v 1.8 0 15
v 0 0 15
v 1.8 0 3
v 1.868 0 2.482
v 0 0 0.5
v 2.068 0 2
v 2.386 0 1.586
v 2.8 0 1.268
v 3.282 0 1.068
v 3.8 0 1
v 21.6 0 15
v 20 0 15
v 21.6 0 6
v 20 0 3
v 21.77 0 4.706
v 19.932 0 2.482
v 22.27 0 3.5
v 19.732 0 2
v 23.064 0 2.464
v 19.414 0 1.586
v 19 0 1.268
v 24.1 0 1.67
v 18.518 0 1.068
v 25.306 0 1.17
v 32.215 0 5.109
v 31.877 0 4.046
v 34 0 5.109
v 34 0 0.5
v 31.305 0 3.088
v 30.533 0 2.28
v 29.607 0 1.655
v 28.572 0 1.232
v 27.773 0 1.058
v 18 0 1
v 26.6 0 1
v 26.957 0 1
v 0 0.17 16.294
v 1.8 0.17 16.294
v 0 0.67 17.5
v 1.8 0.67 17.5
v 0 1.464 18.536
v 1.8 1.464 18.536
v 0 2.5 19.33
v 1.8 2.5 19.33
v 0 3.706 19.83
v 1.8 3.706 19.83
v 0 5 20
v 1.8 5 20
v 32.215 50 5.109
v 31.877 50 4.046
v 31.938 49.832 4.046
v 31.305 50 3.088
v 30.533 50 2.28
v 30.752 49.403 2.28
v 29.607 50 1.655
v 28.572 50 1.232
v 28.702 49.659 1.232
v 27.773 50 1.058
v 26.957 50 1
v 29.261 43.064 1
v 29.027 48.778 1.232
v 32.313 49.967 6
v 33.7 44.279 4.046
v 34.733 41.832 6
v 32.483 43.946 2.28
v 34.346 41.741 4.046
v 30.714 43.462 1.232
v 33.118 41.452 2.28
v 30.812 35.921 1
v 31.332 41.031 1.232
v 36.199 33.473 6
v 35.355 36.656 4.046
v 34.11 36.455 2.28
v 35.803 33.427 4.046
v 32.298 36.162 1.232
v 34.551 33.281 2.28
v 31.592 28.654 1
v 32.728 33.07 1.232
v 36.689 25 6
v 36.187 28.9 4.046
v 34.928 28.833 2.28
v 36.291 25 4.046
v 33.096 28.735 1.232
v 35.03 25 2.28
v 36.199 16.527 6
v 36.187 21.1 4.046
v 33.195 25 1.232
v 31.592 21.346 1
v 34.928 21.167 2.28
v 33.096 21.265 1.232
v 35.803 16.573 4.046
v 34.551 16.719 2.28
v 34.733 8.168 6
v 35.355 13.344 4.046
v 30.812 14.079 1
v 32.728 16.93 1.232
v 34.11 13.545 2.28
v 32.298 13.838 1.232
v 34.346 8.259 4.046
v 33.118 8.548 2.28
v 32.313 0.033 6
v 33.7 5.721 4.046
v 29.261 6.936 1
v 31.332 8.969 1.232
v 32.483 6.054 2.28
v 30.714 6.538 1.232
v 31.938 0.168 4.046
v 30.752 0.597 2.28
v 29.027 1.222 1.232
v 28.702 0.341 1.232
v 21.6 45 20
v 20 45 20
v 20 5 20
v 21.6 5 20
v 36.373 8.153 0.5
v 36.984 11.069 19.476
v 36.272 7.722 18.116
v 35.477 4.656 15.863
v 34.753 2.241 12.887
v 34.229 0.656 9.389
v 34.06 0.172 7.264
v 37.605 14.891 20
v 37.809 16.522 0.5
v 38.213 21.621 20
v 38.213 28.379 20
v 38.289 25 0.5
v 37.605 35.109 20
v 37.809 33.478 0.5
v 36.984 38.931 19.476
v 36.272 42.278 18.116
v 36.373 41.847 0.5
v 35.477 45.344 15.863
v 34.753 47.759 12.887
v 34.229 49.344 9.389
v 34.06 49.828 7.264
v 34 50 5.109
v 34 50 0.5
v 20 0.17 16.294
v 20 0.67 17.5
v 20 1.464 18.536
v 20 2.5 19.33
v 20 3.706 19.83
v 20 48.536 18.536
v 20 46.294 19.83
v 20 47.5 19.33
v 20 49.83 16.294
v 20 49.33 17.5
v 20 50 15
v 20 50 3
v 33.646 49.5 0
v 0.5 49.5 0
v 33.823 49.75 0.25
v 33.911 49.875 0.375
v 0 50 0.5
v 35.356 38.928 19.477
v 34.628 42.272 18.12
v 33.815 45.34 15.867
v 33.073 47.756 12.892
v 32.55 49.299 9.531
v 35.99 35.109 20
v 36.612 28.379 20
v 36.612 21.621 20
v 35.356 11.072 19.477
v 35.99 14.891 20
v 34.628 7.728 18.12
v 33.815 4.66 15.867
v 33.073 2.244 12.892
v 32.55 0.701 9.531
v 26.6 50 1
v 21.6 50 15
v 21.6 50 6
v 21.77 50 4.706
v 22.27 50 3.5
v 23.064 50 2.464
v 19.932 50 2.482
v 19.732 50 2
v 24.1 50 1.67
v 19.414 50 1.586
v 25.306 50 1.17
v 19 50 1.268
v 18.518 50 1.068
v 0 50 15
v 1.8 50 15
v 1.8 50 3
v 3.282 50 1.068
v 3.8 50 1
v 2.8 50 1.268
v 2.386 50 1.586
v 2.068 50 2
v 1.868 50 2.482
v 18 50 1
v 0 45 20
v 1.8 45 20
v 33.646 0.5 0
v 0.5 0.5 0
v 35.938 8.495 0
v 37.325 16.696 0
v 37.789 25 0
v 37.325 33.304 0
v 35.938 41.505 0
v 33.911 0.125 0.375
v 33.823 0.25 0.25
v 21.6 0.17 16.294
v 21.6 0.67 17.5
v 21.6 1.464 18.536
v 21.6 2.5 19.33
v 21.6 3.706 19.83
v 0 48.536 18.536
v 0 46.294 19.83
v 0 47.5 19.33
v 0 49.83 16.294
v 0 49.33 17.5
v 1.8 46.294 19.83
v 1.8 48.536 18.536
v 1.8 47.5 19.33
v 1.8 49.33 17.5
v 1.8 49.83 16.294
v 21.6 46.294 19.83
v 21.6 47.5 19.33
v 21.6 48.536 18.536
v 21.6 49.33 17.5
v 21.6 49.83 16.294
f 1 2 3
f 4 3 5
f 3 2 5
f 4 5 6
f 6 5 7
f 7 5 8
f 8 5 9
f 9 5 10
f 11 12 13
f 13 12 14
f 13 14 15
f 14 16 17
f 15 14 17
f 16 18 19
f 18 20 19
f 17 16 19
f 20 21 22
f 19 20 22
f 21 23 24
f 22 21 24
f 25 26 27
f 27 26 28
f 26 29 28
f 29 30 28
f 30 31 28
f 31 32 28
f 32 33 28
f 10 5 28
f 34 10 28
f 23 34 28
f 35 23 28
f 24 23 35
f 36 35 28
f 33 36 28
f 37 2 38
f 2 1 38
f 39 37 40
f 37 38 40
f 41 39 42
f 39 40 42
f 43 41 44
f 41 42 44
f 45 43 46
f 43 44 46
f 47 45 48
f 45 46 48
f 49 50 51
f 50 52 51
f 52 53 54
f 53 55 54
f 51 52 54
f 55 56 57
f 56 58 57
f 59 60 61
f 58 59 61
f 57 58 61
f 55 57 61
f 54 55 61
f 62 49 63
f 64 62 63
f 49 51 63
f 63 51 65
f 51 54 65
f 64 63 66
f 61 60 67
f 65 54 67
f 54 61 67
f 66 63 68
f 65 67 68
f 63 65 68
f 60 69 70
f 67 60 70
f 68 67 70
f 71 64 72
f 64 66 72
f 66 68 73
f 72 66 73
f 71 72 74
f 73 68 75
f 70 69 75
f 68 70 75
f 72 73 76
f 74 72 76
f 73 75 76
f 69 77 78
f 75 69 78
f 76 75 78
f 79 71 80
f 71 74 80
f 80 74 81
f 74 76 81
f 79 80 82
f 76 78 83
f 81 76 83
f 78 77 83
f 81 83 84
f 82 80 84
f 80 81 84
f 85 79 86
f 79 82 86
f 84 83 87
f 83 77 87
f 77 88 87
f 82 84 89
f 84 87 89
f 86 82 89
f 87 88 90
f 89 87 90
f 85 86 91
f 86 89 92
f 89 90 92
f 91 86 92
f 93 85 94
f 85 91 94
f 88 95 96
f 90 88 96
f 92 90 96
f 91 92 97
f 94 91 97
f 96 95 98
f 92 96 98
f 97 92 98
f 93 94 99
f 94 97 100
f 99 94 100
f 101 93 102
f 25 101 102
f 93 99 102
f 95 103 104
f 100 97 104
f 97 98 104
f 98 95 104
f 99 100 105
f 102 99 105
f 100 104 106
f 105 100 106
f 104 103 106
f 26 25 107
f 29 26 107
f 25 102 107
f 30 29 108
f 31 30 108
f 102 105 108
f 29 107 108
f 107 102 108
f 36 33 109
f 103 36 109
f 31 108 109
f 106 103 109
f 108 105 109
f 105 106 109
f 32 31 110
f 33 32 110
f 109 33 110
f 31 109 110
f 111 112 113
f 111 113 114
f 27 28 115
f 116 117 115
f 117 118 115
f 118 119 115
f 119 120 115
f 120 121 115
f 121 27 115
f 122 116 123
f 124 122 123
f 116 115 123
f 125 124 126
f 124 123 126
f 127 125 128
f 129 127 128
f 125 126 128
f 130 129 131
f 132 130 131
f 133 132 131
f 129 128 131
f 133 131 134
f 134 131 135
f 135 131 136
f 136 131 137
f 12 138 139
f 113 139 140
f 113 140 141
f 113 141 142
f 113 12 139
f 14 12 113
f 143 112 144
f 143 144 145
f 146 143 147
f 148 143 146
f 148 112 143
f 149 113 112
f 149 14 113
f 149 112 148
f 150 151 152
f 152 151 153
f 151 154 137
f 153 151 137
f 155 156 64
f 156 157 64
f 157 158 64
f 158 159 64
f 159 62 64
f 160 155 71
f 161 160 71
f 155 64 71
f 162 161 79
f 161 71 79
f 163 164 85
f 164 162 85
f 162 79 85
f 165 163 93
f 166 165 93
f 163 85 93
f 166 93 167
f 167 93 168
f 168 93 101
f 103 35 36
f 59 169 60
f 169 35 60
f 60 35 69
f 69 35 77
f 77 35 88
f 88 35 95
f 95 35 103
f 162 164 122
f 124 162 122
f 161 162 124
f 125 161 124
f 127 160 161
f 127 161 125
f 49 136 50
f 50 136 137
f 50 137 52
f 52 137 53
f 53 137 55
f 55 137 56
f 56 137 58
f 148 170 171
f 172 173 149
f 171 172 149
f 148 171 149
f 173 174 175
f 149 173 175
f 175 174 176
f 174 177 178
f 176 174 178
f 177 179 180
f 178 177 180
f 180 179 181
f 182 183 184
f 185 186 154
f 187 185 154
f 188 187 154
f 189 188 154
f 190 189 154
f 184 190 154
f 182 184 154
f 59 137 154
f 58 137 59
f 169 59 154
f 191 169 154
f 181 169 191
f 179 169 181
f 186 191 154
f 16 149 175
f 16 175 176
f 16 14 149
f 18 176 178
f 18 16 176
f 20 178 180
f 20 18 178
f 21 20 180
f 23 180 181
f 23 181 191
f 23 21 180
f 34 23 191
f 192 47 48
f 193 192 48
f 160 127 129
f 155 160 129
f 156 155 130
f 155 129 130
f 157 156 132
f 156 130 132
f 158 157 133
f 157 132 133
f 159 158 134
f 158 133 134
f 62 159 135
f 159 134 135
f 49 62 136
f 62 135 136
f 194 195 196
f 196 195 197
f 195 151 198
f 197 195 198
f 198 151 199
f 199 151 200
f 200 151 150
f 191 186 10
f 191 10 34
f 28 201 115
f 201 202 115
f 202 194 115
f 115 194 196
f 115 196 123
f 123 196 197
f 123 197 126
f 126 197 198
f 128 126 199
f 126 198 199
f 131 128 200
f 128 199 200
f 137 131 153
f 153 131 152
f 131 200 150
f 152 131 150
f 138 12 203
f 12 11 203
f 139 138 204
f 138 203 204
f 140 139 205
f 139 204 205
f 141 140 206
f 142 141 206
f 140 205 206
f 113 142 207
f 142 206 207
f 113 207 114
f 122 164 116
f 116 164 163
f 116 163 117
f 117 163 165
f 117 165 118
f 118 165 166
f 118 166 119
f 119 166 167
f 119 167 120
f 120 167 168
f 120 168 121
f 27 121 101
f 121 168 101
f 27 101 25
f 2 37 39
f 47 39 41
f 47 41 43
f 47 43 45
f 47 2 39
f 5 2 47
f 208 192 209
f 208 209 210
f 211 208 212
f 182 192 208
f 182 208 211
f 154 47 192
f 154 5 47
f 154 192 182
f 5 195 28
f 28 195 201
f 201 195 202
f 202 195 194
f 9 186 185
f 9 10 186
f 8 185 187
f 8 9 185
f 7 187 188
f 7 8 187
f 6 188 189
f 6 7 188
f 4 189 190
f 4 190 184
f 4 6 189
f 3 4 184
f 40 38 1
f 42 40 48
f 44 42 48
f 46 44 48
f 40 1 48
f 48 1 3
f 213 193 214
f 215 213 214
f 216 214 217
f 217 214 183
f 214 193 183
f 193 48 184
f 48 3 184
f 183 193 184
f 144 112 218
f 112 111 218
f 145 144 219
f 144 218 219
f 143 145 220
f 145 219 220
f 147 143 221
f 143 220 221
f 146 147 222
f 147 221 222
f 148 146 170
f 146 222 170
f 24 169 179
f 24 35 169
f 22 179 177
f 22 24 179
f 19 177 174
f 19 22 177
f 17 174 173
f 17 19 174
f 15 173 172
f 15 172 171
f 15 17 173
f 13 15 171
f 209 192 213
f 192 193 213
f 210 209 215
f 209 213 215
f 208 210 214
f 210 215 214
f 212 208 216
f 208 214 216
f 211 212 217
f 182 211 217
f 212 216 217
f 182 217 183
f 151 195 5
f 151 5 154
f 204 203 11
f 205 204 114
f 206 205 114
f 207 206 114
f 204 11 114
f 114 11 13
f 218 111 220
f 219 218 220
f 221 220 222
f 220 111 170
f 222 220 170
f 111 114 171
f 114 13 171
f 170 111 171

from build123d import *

# Parameters (mm, degrees)
F0_W         = 1.8
F0_H         = 50
F0_W_2       = 18.2
F0_W_3       = 1.6
F1_DEPTH     = 1
F2_DEPTH     = 20
F3_DEPTH     = 20
F4_T4_DEPTH  = 76.7042031505
F4_T9_DEPTH  = 76.6048284538
F4_T14_DEPTH = 76.8048284538
F4_T19_DEPTH = 76.7042031505
F4_T24_DEPTH = 76.6048284538
F4_T29_DEPTH = 76.8048284538
F5_R         = 5
F6_R         = 2
F7_R         = 5
F8_SIZE      = 0.5


# Not quite as in the source:
# - a fillet or chamfer that OpenCascade refuses, or shapes differently, is made with other operations: its cross-section is extruded or revolved along the edge and cut away or added


with BuildPart() as f1:
    # F0 (on Top) → F1 (new body)
    with BuildSketch(Plane.XY):
        with Locations((0.9, 25)):
            Rectangle(F0_W, F0_H)
        with Locations((10.9, 25)):
            Rectangle(F0_W_2, F0_H)
        with Locations((20.8, 25)):
            Rectangle(F0_W_3, F0_H)
        with BuildLine():
            Line((21.6, 50), (21.6, 0))
            Line((21.6, 0), (32.3006253033, 0))
            ThreePointArc((32.3006253033, 0), (36.6893218813, 25), (32.3006253033, 50))
            Line((32.3006253033, 50), (21.6, 50))
        make_face()
        with BuildLine():
            ThreePointArc((32.3006253033, 50), (36.6893218813, 25), (32.3006253033, 0))
            Line((32.3006253033, 0), (34, 0))
            ThreePointArc((34, 0), (38.2893218813, 25), (34, 50))
            Line((34, 50), (32.3006253033, 50))
        make_face()
    extrude(amount=F1_DEPTH)

    # F0 (on Top) → F2 (join)
    with BuildSketch(Plane.XY):
        with Locations((0.9, 25)):
            Rectangle(F0_W, F0_H)
        with Locations((20.8, 25)):
            Rectangle(F0_W_3, F0_H)
    extrude(amount=F2_DEPTH)

    # F0 (on Top) → F3 (join)
    with BuildSketch(Plane.XY):
        with BuildLine():
            ThreePointArc((32.3006253033, 50), (36.6893218813, 25), (32.3006253033, 0))
            Line((32.3006253033, 0), (34, 0))
            ThreePointArc((34, 0), (38.2893218813, 25), (34, 50))
            Line((34, 50), (32.3006253033, 50))
        make_face()
    extrude(amount=F3_DEPTH)

    # F4: fillet of radius 15 on 6 edges, made by hand


with BuildPart() as f4_tool2:
    # F4_s3 → F4_t4 (new body)
    with BuildSketch(Plane.YZ.offset(-5.2017889236)):
        with BuildLine():
            ThreePointArc((15.0009656854, 20.0004), (4.3933982822, 15.6066017178), (-0.0004, 4.9990343146))
            Line((-0.0004, 4.9990343146), (-1.5005365685, 4.9990343146))
            ThreePointArc((-1.5005365685, 4.9990343146), (-1.5001365685, 12.4995171573), (-1.5001365685, 20))
            Line((-1.5001365685, 20), (0, 21.5001365685))
            ThreePointArc((0, 21.5001365685), (7.5004828427, 21.5001365685), (15.0009656854, 21.5005365685))
            Line((15.0009656854, 21.5005365685), (15.0009656854, 20.0004))
        make_face()
    extrude(amount=F4_T4_DEPTH)

    split(bisect_by=Plane.YZ.offset(21.6), keep=Keep.TOP)


with BuildPart() as f1_1:
    add(f1.part)

    # F4_t1: cut F4_tool2
    add(f4_tool2.part, mode=Mode.SUBTRACT)


with BuildPart() as f4_tool7:
    # F4_s8 → F4_t9 (new body)
    with BuildSketch(Plane.YZ.offset(-17.5024142269)):
        with BuildLine():
            ThreePointArc((15.0009656854, 20.0004), (4.3933982822, 15.6066017178), (-0.0004, 4.9990343146))
            Line((-0.0004, 4.9990343146), (-1.5005365685, 4.9990343146))
            ThreePointArc((-1.5005365685, 4.9990343146), (-1.5001365685, 12.4995171573), (-1.5001365685, 20))
            Line((-1.5001365685, 20), (0, 21.5001365685))
            ThreePointArc((0, 21.5001365685), (7.5004828427, 21.5001365685), (15.0009656854, 21.5005365685))
            Line((15.0009656854, 21.5005365685), (15.0009656854, 20.0004))
        make_face()
    extrude(amount=F4_T9_DEPTH)

    split(bisect_by=Plane.YZ.offset(21.6), keep=Keep.TOP)


with BuildPart() as f1_2:
    add(f1_1.part)

    # F4_t6: cut F4_tool7
    add(f4_tool7.part, mode=Mode.SUBTRACT)


with BuildPart() as f4_tool12:
    # F4_s13 → F4_t14 (new body)
    with BuildSketch(Plane.YZ.offset(-37.5024142269)):
        with BuildLine():
            ThreePointArc((-0.0004, 4.9990343146), (4.3933982822, 15.6066017178), (15.0009656854, 20.0004))
            Line((15.0009656854, 20.0004), (15.0009656854, 21.5005365685))
            ThreePointArc((15.0009656854, 21.5005365685), (7.5004828427, 21.5001365685), (0, 21.5001365685))
            Line((0, 21.5001365685), (-1.5001365685, 20))
            ThreePointArc((-1.5001365685, 20), (-1.5001365685, 12.4995171573), (-1.5005365685, 4.9990343146))
            Line((-1.5005365685, 4.9990343146), (-0.0004, 4.9990343146))
        make_face()
    extrude(amount=F4_T14_DEPTH)

    split(bisect_by=Plane.YZ.offset(21.6), keep=Keep.TOP)


with BuildPart() as f1_3:
    add(f1_2.part)

    # F4_t11: cut F4_tool12
    add(f4_tool12.part, mode=Mode.SUBTRACT)


with BuildPart() as f4_tool17:
    # F4_s18 → F4_t19 (new body)
    with BuildSketch(Plane.YZ.offset(71.5024142269)):
        with BuildLine():
            ThreePointArc((34.9990343146, 20.0004), (45.6066017178, 15.6066017178), (50.0004, 4.9990343146))
            Line((50.0004, 4.9990343146), (51.5005365685, 4.9990343146))
            ThreePointArc((51.5005365685, 4.9990343146), (51.5001365685, 12.4995171573), (51.5001365685, 20))
            Line((51.5001365685, 20), (50, 21.5001365685))
            ThreePointArc((50, 21.5001365685), (42.4995171573, 21.5001365685), (34.9990343146, 21.5005365685))
            Line((34.9990343146, 21.5005365685), (34.9990343146, 20.0004))
        make_face()
    extrude(amount=-F4_T19_DEPTH)

    split(bisect_by=Plane.YZ.offset(21.6), keep=Keep.TOP)


with BuildPart() as f1_4:
    add(f1_3.part)

    # F4_t16: cut F4_tool17
    add(f4_tool17.part, mode=Mode.SUBTRACT)


with BuildPart() as f4_tool22:
    # F4_s23 → F4_t24 (new body)
    with BuildSketch(Plane.YZ.offset(59.1024142269)):
        with BuildLine():
            ThreePointArc((34.9990343146, 20.0004), (45.6066017178, 15.6066017178), (50.0004, 4.9990343146))
            Line((50.0004, 4.9990343146), (51.5005365685, 4.9990343146))
            ThreePointArc((51.5005365685, 4.9990343146), (51.5001365685, 12.4995171573), (51.5001365685, 20))
            Line((51.5001365685, 20), (50, 21.5001365685))
            ThreePointArc((50, 21.5001365685), (42.4995171573, 21.5001365685), (34.9990343146, 21.5005365685))
            Line((34.9990343146, 21.5005365685), (34.9990343146, 20.0004))
        make_face()
    extrude(amount=-F4_T24_DEPTH)

    split(bisect_by=Plane.YZ.offset(21.6), keep=Keep.TOP)


with BuildPart() as f1_5:
    add(f1_4.part)

    # F4_t21: cut F4_tool22
    add(f4_tool22.part, mode=Mode.SUBTRACT)


with BuildPart() as f4_tool27:
    # F4_s28 → F4_t29 (new body)
    with BuildSketch(Plane.YZ.offset(39.3024142269)):
        with BuildLine():
            ThreePointArc((34.9990343146, 20.0004), (45.6066017178, 15.6066017178), (50.0004, 4.9990343146))
            Line((50.0004, 4.9990343146), (51.5005365685, 4.9990343146))
            ThreePointArc((51.5005365685, 4.9990343146), (51.5001365685, 12.4995171573), (51.5001365685, 20))
            Line((51.5001365685, 20), (50, 21.5001365685))
            ThreePointArc((50, 21.5001365685), (42.4995171573, 21.5001365685), (34.9990343146, 21.5005365685))
            Line((34.9990343146, 21.5005365685), (34.9990343146, 20.0004))
        make_face()
    extrude(amount=-F4_T29_DEPTH)

    split(bisect_by=Plane.YZ.offset(21.6), keep=Keep.TOP)


with BuildPart() as f1_6:
    add(f1_5.part)

    # F4_t26: cut F4_tool27
    add(f4_tool27.part, mode=Mode.SUBTRACT)

    # F5
    f5_edges = [f1_6.edges().sort_by_distance(p)[0] for p in [
        (36.689322, 25, 1),
        (21.6, 25, 1),
    ]]
    fillet(f5_edges, radius=F5_R)

    # F6
    f6_edges = [f1_6.edges().sort_by_distance(p)[0] for p in [
        (1.8, 25, 1),
        (20, 25, 1),
    ]]
    fillet(f6_edges, radius=F6_R)

    # F7
    f7_edges = [f1_6.edges().sort_by_distance(p)[0] for p in [
        (0.9, 0, 20),
        (20.8, 0, 20),
        (20.8, 50, 20),
        (0.9, 50, 20),
    ]]
    fillet(f7_edges, radius=F7_R)

    # F8
    f8_edges = [f1_6.edges().sort_by_distance(p)[0] for p in [
        (0, 25, 0),
        (17, 0, 0),
        (38.289322, 25, 0),
        (17, 50, 0),
    ]]
    chamfer(f8_edges, length=F8_SIZE)


solid = f1_6.part
